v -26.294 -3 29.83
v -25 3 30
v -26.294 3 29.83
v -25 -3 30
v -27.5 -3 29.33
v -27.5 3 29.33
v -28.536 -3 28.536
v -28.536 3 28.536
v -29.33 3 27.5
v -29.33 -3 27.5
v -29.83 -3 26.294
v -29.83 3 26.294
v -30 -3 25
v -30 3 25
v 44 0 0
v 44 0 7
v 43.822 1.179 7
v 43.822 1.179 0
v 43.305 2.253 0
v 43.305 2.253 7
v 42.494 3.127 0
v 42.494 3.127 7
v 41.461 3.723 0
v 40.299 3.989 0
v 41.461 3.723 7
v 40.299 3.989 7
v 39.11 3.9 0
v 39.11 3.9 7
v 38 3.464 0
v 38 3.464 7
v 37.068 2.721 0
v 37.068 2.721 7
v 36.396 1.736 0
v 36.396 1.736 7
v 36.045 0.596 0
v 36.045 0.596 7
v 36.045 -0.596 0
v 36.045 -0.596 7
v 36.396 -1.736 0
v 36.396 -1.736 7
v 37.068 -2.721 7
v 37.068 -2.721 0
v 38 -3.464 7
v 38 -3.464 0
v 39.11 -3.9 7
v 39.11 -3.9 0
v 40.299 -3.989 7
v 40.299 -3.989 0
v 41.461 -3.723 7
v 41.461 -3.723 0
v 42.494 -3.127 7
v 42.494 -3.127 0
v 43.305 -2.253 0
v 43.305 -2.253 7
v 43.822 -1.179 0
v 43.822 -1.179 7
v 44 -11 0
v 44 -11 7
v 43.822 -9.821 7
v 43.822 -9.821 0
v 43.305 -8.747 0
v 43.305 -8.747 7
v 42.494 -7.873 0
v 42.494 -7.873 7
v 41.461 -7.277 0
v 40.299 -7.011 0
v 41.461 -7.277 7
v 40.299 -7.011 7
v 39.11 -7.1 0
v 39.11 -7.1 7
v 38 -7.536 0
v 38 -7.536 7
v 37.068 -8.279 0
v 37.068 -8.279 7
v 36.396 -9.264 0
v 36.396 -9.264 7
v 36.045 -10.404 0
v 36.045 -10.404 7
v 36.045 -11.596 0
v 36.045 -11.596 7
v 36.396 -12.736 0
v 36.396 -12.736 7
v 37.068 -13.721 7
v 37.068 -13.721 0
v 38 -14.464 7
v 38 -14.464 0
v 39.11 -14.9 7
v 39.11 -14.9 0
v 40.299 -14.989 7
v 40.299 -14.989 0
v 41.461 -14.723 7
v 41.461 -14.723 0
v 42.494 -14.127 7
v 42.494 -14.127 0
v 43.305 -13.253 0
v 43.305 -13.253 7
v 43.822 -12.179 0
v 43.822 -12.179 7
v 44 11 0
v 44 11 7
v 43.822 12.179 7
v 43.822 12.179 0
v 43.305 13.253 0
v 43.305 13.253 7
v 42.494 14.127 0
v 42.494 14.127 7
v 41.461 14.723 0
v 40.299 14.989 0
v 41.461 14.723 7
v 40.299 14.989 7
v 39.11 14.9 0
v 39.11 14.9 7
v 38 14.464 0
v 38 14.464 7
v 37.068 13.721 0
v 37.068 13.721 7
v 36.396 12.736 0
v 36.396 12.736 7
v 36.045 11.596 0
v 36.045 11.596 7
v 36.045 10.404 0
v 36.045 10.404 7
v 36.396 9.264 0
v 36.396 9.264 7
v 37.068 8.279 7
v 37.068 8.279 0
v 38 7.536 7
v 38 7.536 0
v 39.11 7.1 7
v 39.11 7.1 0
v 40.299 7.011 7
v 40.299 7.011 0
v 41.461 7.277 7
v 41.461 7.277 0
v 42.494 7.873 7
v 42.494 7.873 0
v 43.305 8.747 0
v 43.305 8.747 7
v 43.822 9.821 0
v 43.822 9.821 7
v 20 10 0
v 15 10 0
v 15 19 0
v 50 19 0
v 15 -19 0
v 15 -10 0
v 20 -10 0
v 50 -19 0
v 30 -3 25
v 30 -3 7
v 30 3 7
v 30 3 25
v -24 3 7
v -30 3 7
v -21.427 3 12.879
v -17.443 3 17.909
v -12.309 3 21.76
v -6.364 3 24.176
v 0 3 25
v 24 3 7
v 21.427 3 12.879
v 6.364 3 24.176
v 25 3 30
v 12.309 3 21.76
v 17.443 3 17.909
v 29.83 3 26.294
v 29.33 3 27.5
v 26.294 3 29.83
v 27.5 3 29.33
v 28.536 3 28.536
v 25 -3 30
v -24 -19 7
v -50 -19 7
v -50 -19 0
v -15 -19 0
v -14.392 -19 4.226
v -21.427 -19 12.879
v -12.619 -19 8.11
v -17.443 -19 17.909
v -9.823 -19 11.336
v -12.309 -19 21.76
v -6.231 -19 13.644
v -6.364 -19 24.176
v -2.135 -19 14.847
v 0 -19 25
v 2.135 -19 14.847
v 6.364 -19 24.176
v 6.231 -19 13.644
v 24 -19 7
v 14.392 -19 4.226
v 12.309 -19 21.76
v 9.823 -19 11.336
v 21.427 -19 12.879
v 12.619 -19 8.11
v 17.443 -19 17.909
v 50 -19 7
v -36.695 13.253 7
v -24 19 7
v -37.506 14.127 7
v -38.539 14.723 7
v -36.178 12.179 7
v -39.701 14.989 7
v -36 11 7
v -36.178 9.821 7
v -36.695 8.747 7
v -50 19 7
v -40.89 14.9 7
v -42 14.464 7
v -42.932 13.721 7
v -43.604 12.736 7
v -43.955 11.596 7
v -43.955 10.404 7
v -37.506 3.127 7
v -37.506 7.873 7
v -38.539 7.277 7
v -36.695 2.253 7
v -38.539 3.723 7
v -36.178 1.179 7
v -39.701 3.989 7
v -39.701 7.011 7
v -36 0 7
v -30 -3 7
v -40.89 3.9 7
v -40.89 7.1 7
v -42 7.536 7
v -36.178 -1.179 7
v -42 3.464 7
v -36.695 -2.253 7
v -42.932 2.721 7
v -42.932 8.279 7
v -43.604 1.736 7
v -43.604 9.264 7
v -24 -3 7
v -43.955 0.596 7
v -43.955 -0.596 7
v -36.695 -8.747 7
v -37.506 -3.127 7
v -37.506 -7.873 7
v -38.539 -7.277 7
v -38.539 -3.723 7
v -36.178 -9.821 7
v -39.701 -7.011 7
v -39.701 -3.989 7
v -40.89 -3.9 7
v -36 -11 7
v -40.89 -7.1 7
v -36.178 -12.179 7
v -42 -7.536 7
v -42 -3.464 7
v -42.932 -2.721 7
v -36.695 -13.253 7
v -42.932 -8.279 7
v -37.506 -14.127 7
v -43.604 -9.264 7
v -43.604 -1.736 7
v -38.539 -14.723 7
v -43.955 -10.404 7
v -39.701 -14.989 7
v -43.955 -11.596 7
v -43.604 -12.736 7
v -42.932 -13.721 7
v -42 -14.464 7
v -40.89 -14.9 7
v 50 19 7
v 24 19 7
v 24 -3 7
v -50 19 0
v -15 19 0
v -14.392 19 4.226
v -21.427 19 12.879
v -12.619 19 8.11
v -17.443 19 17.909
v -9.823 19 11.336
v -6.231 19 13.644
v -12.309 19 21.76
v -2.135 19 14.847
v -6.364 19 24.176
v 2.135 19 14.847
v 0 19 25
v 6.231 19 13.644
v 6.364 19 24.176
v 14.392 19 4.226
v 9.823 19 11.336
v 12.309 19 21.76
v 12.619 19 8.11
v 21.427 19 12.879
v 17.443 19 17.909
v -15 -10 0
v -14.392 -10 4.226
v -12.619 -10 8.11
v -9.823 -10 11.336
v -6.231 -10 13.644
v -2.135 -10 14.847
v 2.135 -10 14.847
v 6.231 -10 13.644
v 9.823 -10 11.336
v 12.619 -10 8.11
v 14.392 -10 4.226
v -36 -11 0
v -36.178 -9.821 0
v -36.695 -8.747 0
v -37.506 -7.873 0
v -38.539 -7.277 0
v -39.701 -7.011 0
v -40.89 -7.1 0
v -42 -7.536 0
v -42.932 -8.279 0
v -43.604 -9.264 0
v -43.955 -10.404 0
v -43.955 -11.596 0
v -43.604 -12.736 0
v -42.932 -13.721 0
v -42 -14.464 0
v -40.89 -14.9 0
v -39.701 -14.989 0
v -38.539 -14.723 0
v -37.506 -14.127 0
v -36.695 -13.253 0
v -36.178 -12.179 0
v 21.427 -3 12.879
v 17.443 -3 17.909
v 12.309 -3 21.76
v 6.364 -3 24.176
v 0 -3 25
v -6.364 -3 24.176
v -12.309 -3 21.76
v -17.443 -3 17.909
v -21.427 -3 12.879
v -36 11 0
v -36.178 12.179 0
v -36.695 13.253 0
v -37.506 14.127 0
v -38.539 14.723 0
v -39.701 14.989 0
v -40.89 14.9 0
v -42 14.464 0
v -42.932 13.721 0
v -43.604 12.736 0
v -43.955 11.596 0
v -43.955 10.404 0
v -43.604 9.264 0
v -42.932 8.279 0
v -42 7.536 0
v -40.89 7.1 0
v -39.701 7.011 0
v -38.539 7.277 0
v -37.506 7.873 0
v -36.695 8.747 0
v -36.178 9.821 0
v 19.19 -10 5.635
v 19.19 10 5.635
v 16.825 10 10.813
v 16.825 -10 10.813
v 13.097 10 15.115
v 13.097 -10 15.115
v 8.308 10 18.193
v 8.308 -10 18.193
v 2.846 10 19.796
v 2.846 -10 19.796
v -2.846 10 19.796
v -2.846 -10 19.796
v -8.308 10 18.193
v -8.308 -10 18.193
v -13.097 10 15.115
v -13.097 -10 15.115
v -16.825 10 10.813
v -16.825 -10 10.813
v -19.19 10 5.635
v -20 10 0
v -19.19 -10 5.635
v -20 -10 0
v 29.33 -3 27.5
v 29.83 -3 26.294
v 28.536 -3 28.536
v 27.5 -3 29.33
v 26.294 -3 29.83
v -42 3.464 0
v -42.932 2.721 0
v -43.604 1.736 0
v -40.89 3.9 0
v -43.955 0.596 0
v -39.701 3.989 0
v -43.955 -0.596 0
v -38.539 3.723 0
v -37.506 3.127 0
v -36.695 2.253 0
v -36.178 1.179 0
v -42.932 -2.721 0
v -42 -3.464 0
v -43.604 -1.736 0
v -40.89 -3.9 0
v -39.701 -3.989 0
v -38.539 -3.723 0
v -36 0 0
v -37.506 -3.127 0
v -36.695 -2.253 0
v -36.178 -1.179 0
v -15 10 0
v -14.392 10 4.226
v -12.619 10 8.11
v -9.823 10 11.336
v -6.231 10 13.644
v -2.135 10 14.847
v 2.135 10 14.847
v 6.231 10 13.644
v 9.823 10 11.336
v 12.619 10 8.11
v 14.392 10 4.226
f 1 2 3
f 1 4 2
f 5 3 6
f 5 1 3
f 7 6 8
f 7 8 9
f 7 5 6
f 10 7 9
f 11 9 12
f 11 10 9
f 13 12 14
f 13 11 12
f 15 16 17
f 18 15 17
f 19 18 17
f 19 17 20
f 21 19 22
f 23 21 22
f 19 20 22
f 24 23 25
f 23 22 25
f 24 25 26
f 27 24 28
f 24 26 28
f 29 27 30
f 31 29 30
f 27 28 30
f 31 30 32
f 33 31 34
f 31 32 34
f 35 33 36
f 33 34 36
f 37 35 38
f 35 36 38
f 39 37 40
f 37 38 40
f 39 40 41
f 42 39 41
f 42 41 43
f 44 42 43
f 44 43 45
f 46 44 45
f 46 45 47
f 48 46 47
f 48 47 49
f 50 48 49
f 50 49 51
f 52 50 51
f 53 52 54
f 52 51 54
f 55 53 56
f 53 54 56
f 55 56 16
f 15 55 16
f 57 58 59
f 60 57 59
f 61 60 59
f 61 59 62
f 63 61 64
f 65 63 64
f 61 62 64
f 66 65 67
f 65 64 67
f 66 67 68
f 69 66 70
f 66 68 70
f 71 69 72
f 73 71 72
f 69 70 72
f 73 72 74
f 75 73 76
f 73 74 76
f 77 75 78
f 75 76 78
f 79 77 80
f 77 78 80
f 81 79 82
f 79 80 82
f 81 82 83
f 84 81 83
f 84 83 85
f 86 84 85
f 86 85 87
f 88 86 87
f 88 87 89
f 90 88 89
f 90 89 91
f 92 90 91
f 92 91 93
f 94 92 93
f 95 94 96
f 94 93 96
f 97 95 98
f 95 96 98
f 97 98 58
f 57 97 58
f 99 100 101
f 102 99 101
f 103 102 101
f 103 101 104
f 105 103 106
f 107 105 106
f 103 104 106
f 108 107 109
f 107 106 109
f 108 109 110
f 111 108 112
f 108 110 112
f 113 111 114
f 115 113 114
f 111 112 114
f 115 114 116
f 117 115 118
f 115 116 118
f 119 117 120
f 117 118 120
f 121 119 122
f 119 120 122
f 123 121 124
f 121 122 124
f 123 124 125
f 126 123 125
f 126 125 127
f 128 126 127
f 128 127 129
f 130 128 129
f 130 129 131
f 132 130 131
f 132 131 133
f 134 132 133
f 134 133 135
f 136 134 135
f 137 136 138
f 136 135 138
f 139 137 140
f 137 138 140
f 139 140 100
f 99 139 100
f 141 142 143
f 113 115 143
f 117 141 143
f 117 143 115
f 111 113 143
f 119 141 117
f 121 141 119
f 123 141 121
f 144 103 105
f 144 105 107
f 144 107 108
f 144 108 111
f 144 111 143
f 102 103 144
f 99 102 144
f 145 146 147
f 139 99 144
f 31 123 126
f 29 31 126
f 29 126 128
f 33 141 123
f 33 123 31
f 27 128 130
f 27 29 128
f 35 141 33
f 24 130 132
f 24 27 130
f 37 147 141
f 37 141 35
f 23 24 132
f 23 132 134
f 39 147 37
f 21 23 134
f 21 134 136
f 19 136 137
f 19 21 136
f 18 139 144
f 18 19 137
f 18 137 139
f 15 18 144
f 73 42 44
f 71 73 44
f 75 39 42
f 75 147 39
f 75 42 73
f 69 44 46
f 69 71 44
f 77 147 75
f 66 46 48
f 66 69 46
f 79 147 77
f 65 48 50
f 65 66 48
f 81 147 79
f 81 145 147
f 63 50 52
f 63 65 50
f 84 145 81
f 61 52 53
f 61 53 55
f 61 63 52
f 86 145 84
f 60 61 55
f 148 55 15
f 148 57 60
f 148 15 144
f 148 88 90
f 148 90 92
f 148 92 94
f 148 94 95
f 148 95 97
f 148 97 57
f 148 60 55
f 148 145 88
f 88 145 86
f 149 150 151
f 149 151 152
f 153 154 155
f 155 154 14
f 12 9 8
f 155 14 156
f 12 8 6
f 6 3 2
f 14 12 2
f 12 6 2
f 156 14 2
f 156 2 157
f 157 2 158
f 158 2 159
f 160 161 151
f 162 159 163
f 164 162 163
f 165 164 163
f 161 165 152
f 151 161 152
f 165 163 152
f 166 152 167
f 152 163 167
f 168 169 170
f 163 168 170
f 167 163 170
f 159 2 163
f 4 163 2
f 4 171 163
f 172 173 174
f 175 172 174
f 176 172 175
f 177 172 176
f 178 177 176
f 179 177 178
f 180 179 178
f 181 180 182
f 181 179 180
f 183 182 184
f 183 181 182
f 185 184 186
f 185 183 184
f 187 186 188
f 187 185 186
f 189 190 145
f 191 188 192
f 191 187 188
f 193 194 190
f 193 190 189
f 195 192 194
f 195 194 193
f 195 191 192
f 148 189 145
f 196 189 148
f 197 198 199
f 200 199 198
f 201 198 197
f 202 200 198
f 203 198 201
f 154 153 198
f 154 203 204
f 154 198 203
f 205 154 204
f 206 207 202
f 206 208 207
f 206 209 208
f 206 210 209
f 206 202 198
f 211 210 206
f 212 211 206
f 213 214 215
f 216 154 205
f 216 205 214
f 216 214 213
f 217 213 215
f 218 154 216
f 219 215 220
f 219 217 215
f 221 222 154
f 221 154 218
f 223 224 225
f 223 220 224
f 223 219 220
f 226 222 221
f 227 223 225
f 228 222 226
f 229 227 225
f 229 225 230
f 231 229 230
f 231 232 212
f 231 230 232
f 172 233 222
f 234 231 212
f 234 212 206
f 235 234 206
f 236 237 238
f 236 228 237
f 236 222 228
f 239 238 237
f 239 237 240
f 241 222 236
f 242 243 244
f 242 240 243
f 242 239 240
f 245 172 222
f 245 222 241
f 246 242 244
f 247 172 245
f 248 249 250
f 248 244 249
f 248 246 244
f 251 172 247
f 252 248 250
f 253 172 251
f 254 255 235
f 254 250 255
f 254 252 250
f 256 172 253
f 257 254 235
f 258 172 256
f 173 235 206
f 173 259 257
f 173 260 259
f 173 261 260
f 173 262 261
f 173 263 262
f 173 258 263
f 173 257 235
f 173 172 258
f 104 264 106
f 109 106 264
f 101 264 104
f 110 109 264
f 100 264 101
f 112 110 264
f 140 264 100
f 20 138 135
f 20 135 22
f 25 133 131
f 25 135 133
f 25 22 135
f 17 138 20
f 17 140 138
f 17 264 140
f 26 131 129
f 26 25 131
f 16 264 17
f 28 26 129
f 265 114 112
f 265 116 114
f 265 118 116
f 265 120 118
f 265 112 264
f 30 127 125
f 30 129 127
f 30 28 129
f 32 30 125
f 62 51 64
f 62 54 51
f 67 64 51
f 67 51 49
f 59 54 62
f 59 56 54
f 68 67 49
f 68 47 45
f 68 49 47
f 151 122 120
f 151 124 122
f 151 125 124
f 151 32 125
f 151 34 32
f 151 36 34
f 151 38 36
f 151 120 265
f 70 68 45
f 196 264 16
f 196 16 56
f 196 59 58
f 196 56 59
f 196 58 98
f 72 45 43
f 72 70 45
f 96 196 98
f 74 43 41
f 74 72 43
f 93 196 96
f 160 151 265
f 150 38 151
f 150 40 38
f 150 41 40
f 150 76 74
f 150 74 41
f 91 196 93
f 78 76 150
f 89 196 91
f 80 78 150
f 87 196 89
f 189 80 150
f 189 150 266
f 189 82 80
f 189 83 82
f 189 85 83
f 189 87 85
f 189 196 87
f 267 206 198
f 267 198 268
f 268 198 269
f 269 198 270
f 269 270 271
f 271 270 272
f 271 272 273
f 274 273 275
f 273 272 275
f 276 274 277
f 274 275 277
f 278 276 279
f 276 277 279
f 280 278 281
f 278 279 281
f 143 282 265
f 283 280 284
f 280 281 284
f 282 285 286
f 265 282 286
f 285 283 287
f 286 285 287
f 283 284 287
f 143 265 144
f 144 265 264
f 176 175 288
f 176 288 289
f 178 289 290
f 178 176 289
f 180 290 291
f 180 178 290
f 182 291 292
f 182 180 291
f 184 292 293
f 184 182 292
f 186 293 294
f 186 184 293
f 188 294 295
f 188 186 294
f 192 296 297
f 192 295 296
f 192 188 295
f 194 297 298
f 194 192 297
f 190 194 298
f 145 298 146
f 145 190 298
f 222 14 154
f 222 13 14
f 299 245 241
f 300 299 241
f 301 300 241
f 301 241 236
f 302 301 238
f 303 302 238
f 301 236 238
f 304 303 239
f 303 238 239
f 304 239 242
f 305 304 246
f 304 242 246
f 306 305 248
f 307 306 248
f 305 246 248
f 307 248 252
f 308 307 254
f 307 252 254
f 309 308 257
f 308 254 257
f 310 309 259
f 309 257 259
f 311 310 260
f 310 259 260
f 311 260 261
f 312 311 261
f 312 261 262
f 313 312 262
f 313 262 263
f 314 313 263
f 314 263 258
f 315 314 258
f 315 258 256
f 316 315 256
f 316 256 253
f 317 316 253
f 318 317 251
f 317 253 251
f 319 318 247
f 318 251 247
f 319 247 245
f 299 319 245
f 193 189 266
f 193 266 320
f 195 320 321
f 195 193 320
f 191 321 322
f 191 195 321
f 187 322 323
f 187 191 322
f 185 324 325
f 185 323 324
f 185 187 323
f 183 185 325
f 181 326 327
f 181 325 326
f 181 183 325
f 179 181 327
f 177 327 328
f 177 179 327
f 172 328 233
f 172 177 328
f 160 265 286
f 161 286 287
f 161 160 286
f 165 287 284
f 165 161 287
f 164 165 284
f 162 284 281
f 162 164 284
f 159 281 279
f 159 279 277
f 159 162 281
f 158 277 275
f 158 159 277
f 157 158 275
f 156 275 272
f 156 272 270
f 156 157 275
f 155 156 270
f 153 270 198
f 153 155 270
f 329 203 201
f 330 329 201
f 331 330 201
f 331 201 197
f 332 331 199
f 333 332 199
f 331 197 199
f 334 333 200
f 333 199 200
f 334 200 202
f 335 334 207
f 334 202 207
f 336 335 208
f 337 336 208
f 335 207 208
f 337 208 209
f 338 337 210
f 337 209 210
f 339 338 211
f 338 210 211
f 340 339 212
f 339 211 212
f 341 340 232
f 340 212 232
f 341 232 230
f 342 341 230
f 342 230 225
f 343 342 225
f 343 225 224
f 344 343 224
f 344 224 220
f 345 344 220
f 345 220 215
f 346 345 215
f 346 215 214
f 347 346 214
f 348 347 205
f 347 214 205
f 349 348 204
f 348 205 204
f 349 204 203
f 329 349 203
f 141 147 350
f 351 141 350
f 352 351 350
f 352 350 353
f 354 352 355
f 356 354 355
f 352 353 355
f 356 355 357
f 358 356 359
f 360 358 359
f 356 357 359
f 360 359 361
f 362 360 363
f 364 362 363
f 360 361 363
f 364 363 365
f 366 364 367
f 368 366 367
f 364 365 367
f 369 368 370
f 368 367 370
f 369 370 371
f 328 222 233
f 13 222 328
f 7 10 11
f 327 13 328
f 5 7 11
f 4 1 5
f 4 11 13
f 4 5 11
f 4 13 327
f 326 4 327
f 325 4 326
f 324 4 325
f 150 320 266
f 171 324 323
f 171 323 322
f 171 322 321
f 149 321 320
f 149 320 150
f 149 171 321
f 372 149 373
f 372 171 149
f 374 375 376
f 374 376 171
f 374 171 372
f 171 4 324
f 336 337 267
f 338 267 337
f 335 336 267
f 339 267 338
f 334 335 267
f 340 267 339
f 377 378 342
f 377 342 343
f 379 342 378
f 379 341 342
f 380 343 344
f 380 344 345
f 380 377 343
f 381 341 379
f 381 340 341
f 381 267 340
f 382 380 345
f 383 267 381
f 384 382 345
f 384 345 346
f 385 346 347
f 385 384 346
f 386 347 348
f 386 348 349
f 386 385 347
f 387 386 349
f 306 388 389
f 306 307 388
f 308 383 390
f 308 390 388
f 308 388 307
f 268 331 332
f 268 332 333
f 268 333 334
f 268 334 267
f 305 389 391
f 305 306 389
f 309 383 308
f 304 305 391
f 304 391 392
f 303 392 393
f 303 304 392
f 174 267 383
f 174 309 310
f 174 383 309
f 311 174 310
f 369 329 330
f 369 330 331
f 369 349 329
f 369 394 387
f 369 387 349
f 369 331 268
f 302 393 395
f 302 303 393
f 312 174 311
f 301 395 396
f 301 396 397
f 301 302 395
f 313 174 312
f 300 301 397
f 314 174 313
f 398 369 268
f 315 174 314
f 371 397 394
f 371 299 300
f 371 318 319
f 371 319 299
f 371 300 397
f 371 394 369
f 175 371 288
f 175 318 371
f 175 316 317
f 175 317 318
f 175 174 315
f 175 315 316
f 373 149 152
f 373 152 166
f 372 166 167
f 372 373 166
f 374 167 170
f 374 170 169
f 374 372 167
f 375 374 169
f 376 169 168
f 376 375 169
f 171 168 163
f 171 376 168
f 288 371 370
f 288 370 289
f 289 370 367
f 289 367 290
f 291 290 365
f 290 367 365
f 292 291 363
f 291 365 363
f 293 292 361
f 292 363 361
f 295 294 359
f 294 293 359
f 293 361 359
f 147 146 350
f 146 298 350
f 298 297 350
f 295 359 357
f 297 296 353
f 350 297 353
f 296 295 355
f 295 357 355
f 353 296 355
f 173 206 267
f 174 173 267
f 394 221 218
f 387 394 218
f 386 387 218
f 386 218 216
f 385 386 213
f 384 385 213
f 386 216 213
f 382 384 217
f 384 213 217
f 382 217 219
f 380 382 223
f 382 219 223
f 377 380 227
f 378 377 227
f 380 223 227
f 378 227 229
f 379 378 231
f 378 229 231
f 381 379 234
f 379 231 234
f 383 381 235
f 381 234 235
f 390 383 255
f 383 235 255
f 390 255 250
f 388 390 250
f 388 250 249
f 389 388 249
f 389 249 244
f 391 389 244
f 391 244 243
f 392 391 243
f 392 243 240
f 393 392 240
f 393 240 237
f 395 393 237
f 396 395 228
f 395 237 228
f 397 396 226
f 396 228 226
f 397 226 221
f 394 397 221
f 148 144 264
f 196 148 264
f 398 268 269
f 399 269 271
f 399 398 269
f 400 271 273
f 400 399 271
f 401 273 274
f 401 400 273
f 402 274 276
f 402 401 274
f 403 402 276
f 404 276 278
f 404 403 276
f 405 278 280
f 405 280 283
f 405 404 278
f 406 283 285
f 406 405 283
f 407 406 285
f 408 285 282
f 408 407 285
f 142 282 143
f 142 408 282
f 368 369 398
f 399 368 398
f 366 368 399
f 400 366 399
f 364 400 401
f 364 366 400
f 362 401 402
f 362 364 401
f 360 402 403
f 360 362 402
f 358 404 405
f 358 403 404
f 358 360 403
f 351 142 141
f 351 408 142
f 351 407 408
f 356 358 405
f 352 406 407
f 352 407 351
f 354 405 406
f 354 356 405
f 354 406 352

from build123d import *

# Parameters (mm, degrees)
F1_DEPTH = 19
F2_R     = 20
F3_DEPTH = 10
F5_DEPTH = 3
F6_R     = 4
F7_DEPTH = 7


with BuildPart() as f1:
    # F0 (on Front) → F1 (new body, symmetric)
    with BuildSketch(Plane.XZ):
        with BuildLine():
            ThreePointArc((-15, 0), (0, 15), (15, 0))
            Line((15, 0), (50, 0))
            Line((50, 0), (50, 7))
            Line((50, 7), (24, 7))
            ThreePointArc((24, 7), (0, 25), (-24, 7))
            Line((-24, 7), (-50, 7))
            Line((-50, 7), (-50, 0))
            Line((-50, 0), (-15, 0))
        make_face()
    extrude(amount=F1_DEPTH, both=True)

    # F2 (on Front) → F3 (cut, symmetric)
    with BuildSketch(Plane.XZ):
        Circle(F2_R)
    extrude(amount=F3_DEPTH, both=True, mode=Mode.SUBTRACT)

    # F4 (on Front) → F5 (join, symmetric)
    with BuildSketch(Plane.XZ):
        with BuildLine():
            Line((-30, 25), (-30, 7))
            Line((-30, 7), (-24, 7))
            ThreePointArc((-24, 7), (0, 25), (24, 7))
            Line((24, 7), (30, 7))
            Line((30, 7), (30, 25))
            ThreePointArc((30, 25), (28.535534, 28.535534), (25, 30))
            Line((25, 30), (-25, 30))
            ThreePointArc((-25, 30), (-28.535534, 28.535534), (-30, 25))
        make_face()
    extrude(amount=F5_DEPTH, both=True)

    # F6 (on face) → F7 (cut, through all)
    with BuildSketch(Plane.XY.offset(7)):
        with Locations((-40, -11)):
            Circle(F6_R)
        with Locations((40, -11)):
            Circle(F6_R)
        with Locations((-40, 0)):
            Circle(F6_R)
        with Locations((40, 0)):
            Circle(F6_R)
        with Locations((-40, 11)):
            Circle(F6_R)
        with Locations((40, 11)):
            Circle(F6_R)
    extrude(amount=-F7_DEPTH, mode=Mode.SUBTRACT)


solid = f1.part
